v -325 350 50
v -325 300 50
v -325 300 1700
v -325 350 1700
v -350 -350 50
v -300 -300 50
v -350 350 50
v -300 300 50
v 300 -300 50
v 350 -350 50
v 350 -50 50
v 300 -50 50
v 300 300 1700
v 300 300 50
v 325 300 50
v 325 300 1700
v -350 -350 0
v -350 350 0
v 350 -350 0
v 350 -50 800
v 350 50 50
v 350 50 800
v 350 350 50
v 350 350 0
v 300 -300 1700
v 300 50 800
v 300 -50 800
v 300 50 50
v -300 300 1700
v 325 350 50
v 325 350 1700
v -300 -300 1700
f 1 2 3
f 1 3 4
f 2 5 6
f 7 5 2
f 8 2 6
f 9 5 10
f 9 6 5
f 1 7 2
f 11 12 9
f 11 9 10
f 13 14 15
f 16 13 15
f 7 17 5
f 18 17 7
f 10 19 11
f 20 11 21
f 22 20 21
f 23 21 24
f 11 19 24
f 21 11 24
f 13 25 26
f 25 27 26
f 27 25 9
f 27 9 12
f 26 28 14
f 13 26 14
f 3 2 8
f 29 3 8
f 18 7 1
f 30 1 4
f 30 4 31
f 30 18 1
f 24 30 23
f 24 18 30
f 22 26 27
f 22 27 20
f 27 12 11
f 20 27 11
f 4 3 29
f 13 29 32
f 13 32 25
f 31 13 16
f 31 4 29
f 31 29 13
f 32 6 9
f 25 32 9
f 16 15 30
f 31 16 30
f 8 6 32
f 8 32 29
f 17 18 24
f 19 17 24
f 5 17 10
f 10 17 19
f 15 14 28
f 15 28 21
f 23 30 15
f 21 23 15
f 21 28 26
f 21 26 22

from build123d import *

# Parameters (mm, degrees)
SKETCH_1_W      = 600
SKETCH_1_H      = 600
EXTRUDE_1_DEPTH = 1700
SKETCH_2_W      = 650
SKETCH_2_H      = 50
EXTRUDE_2_DEPTH = 1700
SKETCH_3_W      = 50
SKETCH_3_H      = 100
EXTRUDE_3_DEPTH = 800
SKETCH_4_W      = 700
SKETCH_4_H      = 700
EXTRUDE_4_DEPTH = 50


with BuildPart() as part:
    # 草图1 → 凸台-拉伸1 (new body)
    with BuildSketch(Plane.XY):
        Rectangle(SKETCH_1_W, SKETCH_1_H)
    extrude(amount=EXTRUDE_1_DEPTH)

    # 草图2 → 凸台-拉伸2 (add)
    with BuildSketch(Plane.XY):
        with Locations((0, 325)):
            Rectangle(SKETCH_2_W, SKETCH_2_H)
    extrude(amount=EXTRUDE_2_DEPTH)

    # 草图3 → 凸台-拉伸3 (add)
    with BuildSketch(Plane.XY):
        with Locations((325, 0)):
            Rectangle(SKETCH_3_W, SKETCH_3_H)
    extrude(amount=EXTRUDE_3_DEPTH)

    # 草图4 → 凸台-拉伸4 (add)
    with BuildSketch(Plane.XY):
        Rectangle(SKETCH_4_W, SKETCH_4_H)
    extrude(amount=EXTRUDE_4_DEPTH)


solid = part.part
